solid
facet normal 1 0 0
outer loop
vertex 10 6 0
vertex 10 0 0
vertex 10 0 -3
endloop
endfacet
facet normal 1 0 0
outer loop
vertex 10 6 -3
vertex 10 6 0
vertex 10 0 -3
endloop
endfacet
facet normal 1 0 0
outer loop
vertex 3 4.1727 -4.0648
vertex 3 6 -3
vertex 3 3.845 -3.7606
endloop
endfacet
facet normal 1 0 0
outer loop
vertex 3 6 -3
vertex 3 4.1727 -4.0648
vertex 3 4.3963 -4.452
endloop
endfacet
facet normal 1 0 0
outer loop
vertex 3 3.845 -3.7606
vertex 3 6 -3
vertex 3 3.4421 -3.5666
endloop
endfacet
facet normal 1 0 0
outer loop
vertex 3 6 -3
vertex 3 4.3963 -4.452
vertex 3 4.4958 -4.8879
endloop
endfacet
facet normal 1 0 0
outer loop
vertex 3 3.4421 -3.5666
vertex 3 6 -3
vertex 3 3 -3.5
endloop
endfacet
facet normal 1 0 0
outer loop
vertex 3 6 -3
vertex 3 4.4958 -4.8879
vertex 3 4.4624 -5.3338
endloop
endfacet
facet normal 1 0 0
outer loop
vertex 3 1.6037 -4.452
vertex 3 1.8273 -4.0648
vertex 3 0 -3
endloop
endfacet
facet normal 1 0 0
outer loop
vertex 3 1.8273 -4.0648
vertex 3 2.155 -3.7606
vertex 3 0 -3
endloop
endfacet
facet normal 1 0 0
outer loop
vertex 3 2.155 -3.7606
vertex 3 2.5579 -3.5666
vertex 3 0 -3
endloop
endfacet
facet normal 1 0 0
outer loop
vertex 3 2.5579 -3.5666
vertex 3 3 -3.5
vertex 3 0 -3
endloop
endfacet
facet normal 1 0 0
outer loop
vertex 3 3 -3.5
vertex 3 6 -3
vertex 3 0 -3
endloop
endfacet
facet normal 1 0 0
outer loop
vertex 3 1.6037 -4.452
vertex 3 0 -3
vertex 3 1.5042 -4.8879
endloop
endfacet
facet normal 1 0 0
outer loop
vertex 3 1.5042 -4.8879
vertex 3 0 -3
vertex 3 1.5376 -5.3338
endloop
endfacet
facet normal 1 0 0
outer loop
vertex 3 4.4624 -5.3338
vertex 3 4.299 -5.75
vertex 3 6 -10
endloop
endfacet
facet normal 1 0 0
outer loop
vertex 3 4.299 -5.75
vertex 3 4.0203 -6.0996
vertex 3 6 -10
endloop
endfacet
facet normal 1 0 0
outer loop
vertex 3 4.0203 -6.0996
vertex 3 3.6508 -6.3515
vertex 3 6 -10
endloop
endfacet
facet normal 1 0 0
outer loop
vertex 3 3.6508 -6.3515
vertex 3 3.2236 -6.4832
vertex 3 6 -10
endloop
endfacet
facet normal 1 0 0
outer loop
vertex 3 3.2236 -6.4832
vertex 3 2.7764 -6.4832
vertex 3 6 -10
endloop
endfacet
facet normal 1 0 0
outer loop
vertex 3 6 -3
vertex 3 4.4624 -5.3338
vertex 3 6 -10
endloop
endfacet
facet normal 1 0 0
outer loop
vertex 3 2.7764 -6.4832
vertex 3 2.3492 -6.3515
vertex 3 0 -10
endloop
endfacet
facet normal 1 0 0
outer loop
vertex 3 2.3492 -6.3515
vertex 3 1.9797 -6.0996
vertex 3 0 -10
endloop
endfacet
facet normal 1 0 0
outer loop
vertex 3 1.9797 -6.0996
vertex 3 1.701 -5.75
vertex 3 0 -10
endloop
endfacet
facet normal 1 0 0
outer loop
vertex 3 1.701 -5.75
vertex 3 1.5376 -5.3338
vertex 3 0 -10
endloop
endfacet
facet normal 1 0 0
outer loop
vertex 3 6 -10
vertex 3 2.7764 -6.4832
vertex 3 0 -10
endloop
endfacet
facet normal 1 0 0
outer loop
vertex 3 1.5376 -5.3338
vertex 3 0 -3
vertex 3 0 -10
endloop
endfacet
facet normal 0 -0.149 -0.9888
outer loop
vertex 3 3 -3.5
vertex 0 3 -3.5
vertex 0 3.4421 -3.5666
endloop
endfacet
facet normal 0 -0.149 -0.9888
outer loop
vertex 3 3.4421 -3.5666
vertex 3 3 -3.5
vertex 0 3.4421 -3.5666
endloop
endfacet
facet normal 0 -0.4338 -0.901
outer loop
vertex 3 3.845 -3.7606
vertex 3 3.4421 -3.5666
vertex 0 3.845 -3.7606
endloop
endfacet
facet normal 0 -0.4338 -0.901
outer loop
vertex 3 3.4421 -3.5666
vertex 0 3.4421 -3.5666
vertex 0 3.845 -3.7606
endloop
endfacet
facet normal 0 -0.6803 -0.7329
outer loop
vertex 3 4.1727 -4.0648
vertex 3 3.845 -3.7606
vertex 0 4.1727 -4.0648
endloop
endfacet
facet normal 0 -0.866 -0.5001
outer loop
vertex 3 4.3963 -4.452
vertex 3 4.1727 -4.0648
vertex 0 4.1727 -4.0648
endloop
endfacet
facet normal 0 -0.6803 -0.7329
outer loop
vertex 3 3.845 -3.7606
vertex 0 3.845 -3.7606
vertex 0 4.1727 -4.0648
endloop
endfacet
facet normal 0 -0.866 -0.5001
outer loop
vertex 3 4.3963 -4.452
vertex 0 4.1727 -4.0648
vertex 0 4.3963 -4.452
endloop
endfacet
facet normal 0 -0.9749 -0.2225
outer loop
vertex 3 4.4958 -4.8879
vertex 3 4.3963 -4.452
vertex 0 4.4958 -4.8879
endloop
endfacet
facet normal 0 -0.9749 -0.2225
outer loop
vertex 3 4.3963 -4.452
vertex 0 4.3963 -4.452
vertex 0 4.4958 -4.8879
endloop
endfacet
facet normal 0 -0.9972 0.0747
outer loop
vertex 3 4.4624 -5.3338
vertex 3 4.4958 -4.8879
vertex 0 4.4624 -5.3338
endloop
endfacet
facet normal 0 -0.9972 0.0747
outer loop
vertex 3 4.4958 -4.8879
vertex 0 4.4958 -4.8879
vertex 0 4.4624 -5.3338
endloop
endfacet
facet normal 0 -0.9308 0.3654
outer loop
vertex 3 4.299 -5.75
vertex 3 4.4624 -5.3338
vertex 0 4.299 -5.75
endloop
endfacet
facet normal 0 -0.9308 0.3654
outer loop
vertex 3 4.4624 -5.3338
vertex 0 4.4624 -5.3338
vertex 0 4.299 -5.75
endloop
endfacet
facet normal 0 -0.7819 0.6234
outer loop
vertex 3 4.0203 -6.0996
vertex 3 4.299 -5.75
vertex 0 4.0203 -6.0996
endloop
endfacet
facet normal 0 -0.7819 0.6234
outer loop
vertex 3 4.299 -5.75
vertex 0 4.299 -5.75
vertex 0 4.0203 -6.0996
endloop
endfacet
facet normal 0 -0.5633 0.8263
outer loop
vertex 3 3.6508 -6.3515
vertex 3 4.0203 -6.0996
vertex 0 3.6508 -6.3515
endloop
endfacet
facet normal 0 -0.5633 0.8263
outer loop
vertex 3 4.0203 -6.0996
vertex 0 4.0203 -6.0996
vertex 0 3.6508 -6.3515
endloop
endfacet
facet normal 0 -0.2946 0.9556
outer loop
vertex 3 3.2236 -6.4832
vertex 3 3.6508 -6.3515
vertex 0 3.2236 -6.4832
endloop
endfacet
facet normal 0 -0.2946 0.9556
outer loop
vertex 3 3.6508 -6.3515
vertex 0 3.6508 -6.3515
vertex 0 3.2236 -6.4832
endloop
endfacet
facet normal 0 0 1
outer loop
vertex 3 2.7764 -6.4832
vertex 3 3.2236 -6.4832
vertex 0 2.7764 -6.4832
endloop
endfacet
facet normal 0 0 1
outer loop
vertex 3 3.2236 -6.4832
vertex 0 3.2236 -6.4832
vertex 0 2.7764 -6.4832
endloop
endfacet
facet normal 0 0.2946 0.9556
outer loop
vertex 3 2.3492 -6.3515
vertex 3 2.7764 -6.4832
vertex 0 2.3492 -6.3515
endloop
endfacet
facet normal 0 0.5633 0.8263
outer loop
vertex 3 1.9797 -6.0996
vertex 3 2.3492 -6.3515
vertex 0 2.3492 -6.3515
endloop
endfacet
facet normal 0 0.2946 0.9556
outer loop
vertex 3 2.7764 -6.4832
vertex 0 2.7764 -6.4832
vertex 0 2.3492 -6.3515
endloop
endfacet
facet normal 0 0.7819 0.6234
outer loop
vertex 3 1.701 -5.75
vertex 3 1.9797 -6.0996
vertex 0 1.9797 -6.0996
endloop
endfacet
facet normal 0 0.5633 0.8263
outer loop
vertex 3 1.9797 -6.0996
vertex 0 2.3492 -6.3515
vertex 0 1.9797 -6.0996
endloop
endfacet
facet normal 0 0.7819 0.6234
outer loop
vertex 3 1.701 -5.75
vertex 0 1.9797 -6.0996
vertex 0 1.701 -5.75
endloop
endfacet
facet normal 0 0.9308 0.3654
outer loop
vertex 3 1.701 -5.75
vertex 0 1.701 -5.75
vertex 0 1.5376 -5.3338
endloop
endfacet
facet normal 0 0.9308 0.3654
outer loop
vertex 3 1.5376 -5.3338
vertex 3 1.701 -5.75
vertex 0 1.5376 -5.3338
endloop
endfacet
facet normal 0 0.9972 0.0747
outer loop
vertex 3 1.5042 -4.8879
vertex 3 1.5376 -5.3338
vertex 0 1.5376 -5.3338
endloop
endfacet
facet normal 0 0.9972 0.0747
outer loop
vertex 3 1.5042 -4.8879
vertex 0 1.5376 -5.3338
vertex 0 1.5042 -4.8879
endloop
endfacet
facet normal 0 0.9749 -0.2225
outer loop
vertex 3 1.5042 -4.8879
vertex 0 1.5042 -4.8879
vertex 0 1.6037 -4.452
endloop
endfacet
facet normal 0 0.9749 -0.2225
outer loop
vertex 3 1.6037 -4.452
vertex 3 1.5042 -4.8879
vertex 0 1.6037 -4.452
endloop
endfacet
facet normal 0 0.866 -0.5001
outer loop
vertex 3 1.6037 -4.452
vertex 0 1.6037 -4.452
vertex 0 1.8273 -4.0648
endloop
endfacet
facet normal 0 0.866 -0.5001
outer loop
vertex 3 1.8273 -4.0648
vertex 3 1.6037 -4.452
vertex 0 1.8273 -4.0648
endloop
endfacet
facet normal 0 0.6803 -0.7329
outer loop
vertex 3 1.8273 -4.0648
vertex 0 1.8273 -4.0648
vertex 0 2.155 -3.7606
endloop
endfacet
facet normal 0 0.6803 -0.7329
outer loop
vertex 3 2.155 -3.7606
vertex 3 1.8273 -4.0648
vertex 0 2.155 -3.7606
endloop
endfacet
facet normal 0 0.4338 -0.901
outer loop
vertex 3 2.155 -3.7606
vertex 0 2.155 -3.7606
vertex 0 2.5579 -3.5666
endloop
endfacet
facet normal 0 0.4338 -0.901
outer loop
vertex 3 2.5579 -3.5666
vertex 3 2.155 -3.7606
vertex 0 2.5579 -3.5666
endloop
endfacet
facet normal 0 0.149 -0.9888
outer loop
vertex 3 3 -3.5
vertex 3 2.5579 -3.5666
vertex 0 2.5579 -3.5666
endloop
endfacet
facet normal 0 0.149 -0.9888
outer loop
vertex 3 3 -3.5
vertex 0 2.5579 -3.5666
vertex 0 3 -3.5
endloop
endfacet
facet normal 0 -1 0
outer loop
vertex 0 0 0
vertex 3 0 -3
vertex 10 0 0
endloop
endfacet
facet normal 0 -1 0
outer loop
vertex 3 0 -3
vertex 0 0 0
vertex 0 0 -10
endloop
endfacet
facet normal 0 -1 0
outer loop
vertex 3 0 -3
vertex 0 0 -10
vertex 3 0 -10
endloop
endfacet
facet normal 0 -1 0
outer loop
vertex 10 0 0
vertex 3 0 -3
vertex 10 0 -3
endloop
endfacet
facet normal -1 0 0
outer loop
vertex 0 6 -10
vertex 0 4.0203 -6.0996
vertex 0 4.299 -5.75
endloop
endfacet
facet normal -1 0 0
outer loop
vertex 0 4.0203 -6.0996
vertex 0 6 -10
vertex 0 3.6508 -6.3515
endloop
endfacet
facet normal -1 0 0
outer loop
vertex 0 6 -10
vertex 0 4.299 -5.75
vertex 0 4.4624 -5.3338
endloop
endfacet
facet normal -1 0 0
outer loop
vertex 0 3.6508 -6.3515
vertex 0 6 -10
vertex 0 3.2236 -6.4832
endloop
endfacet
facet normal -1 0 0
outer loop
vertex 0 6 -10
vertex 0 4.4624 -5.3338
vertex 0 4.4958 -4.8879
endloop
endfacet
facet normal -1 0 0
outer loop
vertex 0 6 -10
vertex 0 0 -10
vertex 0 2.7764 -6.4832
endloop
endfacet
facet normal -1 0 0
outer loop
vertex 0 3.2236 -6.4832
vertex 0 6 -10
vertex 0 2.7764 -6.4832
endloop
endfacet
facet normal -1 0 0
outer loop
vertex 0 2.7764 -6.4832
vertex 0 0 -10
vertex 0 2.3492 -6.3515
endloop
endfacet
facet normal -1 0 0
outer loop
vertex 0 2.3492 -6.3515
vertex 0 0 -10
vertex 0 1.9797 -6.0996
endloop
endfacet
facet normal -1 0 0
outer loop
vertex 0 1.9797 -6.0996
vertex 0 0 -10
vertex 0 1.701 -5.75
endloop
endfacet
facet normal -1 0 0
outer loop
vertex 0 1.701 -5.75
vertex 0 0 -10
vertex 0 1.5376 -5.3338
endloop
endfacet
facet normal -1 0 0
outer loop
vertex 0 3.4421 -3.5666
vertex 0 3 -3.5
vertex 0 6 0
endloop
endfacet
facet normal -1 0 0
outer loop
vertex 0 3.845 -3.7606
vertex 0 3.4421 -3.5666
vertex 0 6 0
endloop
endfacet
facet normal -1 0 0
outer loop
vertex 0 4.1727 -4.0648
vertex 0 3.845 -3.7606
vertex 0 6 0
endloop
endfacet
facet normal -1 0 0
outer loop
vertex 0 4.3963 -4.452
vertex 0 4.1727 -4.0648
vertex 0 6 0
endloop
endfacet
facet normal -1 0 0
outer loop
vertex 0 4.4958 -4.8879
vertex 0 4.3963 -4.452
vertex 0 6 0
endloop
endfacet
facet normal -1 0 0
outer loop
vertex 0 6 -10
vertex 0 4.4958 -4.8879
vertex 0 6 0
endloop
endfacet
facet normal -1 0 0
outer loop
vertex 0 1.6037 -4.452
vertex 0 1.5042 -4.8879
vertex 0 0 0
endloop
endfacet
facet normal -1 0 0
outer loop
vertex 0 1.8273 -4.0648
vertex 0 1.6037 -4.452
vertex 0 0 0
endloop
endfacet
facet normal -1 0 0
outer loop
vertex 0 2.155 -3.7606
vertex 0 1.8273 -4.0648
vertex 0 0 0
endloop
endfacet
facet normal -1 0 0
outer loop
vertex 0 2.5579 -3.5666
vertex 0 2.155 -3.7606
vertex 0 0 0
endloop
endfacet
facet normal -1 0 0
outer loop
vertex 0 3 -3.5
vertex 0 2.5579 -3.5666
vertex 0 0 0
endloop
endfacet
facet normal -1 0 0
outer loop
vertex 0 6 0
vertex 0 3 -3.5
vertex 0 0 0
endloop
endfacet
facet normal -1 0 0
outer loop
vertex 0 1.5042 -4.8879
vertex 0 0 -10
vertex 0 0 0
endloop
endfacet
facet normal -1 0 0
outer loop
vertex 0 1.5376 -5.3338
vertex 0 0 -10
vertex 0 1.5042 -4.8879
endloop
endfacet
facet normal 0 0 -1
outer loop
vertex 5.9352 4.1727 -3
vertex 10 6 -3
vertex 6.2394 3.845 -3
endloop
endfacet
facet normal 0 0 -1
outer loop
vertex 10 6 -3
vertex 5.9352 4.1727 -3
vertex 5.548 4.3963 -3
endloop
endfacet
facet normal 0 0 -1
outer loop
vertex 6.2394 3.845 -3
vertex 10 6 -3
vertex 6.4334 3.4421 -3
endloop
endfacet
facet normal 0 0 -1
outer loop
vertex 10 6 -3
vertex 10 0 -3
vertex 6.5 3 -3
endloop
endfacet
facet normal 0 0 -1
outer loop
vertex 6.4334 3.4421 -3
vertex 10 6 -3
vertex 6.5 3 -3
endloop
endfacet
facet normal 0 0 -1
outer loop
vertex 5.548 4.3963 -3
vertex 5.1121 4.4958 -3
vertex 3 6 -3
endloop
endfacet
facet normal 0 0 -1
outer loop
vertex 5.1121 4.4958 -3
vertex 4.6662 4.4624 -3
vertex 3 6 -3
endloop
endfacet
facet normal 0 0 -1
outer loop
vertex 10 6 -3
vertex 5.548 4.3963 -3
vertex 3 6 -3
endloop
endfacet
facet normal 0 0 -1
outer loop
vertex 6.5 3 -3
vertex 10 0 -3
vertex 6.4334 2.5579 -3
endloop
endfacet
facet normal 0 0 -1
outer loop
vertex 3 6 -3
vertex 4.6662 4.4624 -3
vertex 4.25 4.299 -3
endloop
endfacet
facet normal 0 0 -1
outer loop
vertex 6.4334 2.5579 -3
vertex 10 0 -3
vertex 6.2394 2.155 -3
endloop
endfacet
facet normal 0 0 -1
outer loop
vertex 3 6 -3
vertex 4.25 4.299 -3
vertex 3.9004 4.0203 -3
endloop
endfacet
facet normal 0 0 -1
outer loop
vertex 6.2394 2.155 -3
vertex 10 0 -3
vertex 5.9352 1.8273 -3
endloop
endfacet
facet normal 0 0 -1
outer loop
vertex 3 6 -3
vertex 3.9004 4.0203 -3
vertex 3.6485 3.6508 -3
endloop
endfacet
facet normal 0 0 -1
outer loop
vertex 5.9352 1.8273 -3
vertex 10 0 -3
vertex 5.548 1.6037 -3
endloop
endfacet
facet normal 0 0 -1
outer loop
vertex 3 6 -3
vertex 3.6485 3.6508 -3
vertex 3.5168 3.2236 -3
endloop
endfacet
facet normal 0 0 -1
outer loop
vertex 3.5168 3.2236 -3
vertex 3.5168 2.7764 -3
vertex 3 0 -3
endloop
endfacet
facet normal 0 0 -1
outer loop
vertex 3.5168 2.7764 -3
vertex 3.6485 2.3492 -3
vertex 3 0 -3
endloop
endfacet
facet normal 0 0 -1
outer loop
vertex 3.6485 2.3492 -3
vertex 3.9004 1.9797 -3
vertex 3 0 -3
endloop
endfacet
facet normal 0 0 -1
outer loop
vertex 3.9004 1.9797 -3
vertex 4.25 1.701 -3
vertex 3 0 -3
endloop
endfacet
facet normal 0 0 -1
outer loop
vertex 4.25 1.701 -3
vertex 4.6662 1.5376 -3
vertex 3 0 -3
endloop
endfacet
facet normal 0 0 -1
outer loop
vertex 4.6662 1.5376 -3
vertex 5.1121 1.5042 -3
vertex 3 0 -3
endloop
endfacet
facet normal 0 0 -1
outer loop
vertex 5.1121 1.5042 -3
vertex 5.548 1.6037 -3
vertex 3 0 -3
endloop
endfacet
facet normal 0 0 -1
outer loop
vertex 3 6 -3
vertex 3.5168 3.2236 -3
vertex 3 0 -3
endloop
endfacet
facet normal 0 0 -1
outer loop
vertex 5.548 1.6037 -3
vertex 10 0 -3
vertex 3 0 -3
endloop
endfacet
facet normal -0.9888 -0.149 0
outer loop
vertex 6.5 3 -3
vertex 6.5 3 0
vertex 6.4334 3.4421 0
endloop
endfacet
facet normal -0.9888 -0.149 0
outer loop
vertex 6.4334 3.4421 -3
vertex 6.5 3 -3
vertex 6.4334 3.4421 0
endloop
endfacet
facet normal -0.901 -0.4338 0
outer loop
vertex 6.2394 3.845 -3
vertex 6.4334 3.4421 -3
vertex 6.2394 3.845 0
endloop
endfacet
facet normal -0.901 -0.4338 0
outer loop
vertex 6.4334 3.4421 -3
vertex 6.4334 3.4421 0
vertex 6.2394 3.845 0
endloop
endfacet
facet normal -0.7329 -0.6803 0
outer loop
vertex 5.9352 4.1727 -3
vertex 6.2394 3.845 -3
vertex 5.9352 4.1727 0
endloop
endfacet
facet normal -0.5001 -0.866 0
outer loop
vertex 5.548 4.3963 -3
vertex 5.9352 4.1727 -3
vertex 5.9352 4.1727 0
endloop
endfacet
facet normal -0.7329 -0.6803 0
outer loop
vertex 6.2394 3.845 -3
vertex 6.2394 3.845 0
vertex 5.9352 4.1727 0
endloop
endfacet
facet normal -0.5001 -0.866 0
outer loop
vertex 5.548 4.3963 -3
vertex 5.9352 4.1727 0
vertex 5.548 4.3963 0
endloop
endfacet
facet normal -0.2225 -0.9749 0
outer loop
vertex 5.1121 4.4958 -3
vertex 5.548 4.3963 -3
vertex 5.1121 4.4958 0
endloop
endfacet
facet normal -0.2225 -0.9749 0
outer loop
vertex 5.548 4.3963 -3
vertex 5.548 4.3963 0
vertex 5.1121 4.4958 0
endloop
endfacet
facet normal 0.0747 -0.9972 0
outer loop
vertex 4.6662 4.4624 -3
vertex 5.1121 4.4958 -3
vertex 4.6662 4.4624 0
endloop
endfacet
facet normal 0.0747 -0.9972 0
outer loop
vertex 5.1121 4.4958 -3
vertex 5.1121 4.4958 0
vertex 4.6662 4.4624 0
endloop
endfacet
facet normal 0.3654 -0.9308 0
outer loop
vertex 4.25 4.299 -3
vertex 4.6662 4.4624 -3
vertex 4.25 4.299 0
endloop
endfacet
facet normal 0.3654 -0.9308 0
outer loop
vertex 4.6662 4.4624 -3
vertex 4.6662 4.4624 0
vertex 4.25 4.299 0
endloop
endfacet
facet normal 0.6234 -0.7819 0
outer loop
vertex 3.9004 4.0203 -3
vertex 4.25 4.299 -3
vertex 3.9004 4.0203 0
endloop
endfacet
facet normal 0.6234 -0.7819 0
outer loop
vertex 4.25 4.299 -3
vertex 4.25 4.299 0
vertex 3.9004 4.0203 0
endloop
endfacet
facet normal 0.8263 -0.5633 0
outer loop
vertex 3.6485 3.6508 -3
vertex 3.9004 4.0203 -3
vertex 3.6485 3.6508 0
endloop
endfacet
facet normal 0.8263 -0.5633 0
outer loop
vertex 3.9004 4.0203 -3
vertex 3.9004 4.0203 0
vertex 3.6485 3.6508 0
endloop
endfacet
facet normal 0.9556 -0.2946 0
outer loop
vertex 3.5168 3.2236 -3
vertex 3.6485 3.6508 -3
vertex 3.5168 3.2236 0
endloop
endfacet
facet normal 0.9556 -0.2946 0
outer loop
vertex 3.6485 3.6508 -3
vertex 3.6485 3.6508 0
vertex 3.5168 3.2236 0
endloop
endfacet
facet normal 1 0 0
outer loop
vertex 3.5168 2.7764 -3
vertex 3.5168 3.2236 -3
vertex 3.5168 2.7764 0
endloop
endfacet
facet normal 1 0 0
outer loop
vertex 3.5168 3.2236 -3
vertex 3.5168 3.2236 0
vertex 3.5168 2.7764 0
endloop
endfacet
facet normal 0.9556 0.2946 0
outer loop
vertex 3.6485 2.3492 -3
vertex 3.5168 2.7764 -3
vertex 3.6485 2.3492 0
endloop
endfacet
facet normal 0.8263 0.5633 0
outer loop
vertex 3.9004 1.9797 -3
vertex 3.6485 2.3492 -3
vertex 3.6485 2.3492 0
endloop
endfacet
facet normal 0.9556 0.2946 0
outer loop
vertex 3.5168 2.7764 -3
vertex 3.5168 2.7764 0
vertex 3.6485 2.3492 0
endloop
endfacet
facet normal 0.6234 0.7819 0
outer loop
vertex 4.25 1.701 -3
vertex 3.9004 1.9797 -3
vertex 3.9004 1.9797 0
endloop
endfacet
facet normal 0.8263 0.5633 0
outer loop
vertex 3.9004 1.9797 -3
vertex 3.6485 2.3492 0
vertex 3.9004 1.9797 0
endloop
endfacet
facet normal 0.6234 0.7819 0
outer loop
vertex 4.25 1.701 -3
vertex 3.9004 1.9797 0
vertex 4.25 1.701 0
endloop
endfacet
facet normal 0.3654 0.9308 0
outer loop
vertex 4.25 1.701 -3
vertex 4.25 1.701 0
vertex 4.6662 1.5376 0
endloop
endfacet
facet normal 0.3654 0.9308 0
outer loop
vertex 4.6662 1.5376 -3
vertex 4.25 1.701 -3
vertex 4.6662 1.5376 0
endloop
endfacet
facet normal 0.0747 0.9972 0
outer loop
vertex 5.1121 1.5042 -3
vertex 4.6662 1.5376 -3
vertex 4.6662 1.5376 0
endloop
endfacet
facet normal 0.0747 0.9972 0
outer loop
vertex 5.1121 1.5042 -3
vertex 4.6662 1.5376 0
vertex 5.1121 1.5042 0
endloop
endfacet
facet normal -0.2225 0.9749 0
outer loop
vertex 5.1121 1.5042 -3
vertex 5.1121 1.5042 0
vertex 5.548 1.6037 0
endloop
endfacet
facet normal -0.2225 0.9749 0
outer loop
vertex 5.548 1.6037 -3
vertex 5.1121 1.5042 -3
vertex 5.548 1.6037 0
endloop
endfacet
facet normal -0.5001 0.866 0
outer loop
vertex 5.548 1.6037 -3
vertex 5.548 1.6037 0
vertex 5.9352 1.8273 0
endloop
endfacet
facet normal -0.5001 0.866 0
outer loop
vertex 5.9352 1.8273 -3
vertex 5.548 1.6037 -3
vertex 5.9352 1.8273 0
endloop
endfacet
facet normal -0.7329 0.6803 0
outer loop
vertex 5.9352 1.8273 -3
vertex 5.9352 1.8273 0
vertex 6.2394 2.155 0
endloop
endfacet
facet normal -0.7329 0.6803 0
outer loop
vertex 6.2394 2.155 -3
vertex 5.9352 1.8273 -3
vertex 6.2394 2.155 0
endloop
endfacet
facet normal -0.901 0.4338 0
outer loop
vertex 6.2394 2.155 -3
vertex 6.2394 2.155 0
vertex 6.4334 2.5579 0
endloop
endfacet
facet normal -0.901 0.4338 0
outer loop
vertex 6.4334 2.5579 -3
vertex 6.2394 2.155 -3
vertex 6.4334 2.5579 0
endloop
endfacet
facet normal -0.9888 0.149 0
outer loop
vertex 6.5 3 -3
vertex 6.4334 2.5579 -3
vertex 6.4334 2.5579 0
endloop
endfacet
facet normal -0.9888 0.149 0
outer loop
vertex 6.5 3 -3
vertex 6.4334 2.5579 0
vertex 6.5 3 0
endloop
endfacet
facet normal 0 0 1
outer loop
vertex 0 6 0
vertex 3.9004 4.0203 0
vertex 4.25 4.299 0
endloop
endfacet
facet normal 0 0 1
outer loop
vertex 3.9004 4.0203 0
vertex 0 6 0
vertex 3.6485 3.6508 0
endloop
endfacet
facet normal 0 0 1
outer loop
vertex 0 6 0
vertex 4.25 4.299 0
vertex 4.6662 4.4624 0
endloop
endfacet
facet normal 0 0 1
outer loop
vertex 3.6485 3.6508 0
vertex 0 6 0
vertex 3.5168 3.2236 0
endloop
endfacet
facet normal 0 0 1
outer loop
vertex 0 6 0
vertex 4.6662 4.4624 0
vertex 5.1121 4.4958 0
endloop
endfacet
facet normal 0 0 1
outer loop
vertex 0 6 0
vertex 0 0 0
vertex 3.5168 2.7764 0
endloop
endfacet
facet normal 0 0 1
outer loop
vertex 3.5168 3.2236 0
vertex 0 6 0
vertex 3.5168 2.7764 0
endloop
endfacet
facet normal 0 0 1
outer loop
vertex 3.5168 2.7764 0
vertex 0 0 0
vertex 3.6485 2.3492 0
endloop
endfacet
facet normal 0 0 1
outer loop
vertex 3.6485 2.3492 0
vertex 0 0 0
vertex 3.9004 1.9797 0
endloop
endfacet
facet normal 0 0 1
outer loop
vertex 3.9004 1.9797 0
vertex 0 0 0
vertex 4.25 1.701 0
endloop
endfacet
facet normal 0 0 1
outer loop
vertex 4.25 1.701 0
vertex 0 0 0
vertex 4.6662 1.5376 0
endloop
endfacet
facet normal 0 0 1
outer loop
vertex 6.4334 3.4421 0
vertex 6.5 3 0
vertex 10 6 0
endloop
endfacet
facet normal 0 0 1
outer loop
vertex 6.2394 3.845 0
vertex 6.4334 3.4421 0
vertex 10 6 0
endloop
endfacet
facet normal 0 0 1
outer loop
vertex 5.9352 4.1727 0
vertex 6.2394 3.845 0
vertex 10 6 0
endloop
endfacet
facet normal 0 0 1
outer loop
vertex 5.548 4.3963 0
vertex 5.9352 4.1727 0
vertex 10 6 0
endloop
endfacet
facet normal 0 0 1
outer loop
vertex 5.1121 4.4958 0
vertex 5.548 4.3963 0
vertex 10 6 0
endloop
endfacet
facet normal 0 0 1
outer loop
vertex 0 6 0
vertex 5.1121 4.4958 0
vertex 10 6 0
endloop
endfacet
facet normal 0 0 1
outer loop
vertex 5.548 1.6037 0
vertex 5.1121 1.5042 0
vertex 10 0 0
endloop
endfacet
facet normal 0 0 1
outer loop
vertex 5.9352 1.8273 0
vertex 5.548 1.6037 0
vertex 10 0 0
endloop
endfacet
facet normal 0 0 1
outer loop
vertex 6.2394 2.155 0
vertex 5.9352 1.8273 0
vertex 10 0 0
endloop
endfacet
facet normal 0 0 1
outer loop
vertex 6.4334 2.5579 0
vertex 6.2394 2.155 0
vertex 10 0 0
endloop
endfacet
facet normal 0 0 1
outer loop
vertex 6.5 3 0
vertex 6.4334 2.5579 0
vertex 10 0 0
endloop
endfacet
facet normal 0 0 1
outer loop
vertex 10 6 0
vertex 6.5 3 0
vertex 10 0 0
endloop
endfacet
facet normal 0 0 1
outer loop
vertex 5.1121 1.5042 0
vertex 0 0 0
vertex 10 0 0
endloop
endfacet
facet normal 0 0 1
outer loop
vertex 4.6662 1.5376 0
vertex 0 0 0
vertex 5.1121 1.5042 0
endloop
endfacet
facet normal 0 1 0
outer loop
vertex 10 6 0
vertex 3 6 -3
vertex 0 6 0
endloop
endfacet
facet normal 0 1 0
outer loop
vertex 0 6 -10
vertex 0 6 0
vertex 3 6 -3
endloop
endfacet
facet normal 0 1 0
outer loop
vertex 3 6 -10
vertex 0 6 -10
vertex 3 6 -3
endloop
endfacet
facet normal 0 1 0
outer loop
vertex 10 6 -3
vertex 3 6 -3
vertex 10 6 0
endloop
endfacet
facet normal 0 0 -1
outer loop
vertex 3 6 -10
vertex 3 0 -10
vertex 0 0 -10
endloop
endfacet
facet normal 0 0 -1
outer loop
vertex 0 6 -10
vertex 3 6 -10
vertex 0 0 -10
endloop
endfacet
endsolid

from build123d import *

# Parameters (mm, degrees)
EXTRUDE_1_DEPTH     = 6
SKETCH_2_R          = 1.5
CUT_EXTRUDE_1_DEPTH = 6
SKETCH_3_R          = 1.5
CUT_EXTRUDE_2_DEPTH = 6


with BuildPart() as part:
    # 草图1 → 凸台-拉伸1 (new body)
    with BuildSketch(Plane(origin=(0, 0, 0), x_dir=(1, 0, 0), z_dir=(0, 1, 0))):
        Polygon((0, 0), (10, 0), (10, 3), (3, 3), (3, 10), (0, 10), align=None)
    extrude(amount=EXTRUDE_1_DEPTH)

    # 草图2 → 切除-拉伸1 (cut)
    with BuildSketch(Plane.XY):
        with Locations((5, 3)):
            Circle(SKETCH_2_R)
    extrude(amount=-CUT_EXTRUDE_1_DEPTH, mode=Mode.SUBTRACT)

    # 草图3 → 切除-拉伸2 (cut)
    with BuildSketch(Plane.ZY):
        with Locations((-5, 3)):
            Circle(SKETCH_3_R)
    extrude(amount=-CUT_EXTRUDE_2_DEPTH, mode=Mode.SUBTRACT)


solid = part.part
